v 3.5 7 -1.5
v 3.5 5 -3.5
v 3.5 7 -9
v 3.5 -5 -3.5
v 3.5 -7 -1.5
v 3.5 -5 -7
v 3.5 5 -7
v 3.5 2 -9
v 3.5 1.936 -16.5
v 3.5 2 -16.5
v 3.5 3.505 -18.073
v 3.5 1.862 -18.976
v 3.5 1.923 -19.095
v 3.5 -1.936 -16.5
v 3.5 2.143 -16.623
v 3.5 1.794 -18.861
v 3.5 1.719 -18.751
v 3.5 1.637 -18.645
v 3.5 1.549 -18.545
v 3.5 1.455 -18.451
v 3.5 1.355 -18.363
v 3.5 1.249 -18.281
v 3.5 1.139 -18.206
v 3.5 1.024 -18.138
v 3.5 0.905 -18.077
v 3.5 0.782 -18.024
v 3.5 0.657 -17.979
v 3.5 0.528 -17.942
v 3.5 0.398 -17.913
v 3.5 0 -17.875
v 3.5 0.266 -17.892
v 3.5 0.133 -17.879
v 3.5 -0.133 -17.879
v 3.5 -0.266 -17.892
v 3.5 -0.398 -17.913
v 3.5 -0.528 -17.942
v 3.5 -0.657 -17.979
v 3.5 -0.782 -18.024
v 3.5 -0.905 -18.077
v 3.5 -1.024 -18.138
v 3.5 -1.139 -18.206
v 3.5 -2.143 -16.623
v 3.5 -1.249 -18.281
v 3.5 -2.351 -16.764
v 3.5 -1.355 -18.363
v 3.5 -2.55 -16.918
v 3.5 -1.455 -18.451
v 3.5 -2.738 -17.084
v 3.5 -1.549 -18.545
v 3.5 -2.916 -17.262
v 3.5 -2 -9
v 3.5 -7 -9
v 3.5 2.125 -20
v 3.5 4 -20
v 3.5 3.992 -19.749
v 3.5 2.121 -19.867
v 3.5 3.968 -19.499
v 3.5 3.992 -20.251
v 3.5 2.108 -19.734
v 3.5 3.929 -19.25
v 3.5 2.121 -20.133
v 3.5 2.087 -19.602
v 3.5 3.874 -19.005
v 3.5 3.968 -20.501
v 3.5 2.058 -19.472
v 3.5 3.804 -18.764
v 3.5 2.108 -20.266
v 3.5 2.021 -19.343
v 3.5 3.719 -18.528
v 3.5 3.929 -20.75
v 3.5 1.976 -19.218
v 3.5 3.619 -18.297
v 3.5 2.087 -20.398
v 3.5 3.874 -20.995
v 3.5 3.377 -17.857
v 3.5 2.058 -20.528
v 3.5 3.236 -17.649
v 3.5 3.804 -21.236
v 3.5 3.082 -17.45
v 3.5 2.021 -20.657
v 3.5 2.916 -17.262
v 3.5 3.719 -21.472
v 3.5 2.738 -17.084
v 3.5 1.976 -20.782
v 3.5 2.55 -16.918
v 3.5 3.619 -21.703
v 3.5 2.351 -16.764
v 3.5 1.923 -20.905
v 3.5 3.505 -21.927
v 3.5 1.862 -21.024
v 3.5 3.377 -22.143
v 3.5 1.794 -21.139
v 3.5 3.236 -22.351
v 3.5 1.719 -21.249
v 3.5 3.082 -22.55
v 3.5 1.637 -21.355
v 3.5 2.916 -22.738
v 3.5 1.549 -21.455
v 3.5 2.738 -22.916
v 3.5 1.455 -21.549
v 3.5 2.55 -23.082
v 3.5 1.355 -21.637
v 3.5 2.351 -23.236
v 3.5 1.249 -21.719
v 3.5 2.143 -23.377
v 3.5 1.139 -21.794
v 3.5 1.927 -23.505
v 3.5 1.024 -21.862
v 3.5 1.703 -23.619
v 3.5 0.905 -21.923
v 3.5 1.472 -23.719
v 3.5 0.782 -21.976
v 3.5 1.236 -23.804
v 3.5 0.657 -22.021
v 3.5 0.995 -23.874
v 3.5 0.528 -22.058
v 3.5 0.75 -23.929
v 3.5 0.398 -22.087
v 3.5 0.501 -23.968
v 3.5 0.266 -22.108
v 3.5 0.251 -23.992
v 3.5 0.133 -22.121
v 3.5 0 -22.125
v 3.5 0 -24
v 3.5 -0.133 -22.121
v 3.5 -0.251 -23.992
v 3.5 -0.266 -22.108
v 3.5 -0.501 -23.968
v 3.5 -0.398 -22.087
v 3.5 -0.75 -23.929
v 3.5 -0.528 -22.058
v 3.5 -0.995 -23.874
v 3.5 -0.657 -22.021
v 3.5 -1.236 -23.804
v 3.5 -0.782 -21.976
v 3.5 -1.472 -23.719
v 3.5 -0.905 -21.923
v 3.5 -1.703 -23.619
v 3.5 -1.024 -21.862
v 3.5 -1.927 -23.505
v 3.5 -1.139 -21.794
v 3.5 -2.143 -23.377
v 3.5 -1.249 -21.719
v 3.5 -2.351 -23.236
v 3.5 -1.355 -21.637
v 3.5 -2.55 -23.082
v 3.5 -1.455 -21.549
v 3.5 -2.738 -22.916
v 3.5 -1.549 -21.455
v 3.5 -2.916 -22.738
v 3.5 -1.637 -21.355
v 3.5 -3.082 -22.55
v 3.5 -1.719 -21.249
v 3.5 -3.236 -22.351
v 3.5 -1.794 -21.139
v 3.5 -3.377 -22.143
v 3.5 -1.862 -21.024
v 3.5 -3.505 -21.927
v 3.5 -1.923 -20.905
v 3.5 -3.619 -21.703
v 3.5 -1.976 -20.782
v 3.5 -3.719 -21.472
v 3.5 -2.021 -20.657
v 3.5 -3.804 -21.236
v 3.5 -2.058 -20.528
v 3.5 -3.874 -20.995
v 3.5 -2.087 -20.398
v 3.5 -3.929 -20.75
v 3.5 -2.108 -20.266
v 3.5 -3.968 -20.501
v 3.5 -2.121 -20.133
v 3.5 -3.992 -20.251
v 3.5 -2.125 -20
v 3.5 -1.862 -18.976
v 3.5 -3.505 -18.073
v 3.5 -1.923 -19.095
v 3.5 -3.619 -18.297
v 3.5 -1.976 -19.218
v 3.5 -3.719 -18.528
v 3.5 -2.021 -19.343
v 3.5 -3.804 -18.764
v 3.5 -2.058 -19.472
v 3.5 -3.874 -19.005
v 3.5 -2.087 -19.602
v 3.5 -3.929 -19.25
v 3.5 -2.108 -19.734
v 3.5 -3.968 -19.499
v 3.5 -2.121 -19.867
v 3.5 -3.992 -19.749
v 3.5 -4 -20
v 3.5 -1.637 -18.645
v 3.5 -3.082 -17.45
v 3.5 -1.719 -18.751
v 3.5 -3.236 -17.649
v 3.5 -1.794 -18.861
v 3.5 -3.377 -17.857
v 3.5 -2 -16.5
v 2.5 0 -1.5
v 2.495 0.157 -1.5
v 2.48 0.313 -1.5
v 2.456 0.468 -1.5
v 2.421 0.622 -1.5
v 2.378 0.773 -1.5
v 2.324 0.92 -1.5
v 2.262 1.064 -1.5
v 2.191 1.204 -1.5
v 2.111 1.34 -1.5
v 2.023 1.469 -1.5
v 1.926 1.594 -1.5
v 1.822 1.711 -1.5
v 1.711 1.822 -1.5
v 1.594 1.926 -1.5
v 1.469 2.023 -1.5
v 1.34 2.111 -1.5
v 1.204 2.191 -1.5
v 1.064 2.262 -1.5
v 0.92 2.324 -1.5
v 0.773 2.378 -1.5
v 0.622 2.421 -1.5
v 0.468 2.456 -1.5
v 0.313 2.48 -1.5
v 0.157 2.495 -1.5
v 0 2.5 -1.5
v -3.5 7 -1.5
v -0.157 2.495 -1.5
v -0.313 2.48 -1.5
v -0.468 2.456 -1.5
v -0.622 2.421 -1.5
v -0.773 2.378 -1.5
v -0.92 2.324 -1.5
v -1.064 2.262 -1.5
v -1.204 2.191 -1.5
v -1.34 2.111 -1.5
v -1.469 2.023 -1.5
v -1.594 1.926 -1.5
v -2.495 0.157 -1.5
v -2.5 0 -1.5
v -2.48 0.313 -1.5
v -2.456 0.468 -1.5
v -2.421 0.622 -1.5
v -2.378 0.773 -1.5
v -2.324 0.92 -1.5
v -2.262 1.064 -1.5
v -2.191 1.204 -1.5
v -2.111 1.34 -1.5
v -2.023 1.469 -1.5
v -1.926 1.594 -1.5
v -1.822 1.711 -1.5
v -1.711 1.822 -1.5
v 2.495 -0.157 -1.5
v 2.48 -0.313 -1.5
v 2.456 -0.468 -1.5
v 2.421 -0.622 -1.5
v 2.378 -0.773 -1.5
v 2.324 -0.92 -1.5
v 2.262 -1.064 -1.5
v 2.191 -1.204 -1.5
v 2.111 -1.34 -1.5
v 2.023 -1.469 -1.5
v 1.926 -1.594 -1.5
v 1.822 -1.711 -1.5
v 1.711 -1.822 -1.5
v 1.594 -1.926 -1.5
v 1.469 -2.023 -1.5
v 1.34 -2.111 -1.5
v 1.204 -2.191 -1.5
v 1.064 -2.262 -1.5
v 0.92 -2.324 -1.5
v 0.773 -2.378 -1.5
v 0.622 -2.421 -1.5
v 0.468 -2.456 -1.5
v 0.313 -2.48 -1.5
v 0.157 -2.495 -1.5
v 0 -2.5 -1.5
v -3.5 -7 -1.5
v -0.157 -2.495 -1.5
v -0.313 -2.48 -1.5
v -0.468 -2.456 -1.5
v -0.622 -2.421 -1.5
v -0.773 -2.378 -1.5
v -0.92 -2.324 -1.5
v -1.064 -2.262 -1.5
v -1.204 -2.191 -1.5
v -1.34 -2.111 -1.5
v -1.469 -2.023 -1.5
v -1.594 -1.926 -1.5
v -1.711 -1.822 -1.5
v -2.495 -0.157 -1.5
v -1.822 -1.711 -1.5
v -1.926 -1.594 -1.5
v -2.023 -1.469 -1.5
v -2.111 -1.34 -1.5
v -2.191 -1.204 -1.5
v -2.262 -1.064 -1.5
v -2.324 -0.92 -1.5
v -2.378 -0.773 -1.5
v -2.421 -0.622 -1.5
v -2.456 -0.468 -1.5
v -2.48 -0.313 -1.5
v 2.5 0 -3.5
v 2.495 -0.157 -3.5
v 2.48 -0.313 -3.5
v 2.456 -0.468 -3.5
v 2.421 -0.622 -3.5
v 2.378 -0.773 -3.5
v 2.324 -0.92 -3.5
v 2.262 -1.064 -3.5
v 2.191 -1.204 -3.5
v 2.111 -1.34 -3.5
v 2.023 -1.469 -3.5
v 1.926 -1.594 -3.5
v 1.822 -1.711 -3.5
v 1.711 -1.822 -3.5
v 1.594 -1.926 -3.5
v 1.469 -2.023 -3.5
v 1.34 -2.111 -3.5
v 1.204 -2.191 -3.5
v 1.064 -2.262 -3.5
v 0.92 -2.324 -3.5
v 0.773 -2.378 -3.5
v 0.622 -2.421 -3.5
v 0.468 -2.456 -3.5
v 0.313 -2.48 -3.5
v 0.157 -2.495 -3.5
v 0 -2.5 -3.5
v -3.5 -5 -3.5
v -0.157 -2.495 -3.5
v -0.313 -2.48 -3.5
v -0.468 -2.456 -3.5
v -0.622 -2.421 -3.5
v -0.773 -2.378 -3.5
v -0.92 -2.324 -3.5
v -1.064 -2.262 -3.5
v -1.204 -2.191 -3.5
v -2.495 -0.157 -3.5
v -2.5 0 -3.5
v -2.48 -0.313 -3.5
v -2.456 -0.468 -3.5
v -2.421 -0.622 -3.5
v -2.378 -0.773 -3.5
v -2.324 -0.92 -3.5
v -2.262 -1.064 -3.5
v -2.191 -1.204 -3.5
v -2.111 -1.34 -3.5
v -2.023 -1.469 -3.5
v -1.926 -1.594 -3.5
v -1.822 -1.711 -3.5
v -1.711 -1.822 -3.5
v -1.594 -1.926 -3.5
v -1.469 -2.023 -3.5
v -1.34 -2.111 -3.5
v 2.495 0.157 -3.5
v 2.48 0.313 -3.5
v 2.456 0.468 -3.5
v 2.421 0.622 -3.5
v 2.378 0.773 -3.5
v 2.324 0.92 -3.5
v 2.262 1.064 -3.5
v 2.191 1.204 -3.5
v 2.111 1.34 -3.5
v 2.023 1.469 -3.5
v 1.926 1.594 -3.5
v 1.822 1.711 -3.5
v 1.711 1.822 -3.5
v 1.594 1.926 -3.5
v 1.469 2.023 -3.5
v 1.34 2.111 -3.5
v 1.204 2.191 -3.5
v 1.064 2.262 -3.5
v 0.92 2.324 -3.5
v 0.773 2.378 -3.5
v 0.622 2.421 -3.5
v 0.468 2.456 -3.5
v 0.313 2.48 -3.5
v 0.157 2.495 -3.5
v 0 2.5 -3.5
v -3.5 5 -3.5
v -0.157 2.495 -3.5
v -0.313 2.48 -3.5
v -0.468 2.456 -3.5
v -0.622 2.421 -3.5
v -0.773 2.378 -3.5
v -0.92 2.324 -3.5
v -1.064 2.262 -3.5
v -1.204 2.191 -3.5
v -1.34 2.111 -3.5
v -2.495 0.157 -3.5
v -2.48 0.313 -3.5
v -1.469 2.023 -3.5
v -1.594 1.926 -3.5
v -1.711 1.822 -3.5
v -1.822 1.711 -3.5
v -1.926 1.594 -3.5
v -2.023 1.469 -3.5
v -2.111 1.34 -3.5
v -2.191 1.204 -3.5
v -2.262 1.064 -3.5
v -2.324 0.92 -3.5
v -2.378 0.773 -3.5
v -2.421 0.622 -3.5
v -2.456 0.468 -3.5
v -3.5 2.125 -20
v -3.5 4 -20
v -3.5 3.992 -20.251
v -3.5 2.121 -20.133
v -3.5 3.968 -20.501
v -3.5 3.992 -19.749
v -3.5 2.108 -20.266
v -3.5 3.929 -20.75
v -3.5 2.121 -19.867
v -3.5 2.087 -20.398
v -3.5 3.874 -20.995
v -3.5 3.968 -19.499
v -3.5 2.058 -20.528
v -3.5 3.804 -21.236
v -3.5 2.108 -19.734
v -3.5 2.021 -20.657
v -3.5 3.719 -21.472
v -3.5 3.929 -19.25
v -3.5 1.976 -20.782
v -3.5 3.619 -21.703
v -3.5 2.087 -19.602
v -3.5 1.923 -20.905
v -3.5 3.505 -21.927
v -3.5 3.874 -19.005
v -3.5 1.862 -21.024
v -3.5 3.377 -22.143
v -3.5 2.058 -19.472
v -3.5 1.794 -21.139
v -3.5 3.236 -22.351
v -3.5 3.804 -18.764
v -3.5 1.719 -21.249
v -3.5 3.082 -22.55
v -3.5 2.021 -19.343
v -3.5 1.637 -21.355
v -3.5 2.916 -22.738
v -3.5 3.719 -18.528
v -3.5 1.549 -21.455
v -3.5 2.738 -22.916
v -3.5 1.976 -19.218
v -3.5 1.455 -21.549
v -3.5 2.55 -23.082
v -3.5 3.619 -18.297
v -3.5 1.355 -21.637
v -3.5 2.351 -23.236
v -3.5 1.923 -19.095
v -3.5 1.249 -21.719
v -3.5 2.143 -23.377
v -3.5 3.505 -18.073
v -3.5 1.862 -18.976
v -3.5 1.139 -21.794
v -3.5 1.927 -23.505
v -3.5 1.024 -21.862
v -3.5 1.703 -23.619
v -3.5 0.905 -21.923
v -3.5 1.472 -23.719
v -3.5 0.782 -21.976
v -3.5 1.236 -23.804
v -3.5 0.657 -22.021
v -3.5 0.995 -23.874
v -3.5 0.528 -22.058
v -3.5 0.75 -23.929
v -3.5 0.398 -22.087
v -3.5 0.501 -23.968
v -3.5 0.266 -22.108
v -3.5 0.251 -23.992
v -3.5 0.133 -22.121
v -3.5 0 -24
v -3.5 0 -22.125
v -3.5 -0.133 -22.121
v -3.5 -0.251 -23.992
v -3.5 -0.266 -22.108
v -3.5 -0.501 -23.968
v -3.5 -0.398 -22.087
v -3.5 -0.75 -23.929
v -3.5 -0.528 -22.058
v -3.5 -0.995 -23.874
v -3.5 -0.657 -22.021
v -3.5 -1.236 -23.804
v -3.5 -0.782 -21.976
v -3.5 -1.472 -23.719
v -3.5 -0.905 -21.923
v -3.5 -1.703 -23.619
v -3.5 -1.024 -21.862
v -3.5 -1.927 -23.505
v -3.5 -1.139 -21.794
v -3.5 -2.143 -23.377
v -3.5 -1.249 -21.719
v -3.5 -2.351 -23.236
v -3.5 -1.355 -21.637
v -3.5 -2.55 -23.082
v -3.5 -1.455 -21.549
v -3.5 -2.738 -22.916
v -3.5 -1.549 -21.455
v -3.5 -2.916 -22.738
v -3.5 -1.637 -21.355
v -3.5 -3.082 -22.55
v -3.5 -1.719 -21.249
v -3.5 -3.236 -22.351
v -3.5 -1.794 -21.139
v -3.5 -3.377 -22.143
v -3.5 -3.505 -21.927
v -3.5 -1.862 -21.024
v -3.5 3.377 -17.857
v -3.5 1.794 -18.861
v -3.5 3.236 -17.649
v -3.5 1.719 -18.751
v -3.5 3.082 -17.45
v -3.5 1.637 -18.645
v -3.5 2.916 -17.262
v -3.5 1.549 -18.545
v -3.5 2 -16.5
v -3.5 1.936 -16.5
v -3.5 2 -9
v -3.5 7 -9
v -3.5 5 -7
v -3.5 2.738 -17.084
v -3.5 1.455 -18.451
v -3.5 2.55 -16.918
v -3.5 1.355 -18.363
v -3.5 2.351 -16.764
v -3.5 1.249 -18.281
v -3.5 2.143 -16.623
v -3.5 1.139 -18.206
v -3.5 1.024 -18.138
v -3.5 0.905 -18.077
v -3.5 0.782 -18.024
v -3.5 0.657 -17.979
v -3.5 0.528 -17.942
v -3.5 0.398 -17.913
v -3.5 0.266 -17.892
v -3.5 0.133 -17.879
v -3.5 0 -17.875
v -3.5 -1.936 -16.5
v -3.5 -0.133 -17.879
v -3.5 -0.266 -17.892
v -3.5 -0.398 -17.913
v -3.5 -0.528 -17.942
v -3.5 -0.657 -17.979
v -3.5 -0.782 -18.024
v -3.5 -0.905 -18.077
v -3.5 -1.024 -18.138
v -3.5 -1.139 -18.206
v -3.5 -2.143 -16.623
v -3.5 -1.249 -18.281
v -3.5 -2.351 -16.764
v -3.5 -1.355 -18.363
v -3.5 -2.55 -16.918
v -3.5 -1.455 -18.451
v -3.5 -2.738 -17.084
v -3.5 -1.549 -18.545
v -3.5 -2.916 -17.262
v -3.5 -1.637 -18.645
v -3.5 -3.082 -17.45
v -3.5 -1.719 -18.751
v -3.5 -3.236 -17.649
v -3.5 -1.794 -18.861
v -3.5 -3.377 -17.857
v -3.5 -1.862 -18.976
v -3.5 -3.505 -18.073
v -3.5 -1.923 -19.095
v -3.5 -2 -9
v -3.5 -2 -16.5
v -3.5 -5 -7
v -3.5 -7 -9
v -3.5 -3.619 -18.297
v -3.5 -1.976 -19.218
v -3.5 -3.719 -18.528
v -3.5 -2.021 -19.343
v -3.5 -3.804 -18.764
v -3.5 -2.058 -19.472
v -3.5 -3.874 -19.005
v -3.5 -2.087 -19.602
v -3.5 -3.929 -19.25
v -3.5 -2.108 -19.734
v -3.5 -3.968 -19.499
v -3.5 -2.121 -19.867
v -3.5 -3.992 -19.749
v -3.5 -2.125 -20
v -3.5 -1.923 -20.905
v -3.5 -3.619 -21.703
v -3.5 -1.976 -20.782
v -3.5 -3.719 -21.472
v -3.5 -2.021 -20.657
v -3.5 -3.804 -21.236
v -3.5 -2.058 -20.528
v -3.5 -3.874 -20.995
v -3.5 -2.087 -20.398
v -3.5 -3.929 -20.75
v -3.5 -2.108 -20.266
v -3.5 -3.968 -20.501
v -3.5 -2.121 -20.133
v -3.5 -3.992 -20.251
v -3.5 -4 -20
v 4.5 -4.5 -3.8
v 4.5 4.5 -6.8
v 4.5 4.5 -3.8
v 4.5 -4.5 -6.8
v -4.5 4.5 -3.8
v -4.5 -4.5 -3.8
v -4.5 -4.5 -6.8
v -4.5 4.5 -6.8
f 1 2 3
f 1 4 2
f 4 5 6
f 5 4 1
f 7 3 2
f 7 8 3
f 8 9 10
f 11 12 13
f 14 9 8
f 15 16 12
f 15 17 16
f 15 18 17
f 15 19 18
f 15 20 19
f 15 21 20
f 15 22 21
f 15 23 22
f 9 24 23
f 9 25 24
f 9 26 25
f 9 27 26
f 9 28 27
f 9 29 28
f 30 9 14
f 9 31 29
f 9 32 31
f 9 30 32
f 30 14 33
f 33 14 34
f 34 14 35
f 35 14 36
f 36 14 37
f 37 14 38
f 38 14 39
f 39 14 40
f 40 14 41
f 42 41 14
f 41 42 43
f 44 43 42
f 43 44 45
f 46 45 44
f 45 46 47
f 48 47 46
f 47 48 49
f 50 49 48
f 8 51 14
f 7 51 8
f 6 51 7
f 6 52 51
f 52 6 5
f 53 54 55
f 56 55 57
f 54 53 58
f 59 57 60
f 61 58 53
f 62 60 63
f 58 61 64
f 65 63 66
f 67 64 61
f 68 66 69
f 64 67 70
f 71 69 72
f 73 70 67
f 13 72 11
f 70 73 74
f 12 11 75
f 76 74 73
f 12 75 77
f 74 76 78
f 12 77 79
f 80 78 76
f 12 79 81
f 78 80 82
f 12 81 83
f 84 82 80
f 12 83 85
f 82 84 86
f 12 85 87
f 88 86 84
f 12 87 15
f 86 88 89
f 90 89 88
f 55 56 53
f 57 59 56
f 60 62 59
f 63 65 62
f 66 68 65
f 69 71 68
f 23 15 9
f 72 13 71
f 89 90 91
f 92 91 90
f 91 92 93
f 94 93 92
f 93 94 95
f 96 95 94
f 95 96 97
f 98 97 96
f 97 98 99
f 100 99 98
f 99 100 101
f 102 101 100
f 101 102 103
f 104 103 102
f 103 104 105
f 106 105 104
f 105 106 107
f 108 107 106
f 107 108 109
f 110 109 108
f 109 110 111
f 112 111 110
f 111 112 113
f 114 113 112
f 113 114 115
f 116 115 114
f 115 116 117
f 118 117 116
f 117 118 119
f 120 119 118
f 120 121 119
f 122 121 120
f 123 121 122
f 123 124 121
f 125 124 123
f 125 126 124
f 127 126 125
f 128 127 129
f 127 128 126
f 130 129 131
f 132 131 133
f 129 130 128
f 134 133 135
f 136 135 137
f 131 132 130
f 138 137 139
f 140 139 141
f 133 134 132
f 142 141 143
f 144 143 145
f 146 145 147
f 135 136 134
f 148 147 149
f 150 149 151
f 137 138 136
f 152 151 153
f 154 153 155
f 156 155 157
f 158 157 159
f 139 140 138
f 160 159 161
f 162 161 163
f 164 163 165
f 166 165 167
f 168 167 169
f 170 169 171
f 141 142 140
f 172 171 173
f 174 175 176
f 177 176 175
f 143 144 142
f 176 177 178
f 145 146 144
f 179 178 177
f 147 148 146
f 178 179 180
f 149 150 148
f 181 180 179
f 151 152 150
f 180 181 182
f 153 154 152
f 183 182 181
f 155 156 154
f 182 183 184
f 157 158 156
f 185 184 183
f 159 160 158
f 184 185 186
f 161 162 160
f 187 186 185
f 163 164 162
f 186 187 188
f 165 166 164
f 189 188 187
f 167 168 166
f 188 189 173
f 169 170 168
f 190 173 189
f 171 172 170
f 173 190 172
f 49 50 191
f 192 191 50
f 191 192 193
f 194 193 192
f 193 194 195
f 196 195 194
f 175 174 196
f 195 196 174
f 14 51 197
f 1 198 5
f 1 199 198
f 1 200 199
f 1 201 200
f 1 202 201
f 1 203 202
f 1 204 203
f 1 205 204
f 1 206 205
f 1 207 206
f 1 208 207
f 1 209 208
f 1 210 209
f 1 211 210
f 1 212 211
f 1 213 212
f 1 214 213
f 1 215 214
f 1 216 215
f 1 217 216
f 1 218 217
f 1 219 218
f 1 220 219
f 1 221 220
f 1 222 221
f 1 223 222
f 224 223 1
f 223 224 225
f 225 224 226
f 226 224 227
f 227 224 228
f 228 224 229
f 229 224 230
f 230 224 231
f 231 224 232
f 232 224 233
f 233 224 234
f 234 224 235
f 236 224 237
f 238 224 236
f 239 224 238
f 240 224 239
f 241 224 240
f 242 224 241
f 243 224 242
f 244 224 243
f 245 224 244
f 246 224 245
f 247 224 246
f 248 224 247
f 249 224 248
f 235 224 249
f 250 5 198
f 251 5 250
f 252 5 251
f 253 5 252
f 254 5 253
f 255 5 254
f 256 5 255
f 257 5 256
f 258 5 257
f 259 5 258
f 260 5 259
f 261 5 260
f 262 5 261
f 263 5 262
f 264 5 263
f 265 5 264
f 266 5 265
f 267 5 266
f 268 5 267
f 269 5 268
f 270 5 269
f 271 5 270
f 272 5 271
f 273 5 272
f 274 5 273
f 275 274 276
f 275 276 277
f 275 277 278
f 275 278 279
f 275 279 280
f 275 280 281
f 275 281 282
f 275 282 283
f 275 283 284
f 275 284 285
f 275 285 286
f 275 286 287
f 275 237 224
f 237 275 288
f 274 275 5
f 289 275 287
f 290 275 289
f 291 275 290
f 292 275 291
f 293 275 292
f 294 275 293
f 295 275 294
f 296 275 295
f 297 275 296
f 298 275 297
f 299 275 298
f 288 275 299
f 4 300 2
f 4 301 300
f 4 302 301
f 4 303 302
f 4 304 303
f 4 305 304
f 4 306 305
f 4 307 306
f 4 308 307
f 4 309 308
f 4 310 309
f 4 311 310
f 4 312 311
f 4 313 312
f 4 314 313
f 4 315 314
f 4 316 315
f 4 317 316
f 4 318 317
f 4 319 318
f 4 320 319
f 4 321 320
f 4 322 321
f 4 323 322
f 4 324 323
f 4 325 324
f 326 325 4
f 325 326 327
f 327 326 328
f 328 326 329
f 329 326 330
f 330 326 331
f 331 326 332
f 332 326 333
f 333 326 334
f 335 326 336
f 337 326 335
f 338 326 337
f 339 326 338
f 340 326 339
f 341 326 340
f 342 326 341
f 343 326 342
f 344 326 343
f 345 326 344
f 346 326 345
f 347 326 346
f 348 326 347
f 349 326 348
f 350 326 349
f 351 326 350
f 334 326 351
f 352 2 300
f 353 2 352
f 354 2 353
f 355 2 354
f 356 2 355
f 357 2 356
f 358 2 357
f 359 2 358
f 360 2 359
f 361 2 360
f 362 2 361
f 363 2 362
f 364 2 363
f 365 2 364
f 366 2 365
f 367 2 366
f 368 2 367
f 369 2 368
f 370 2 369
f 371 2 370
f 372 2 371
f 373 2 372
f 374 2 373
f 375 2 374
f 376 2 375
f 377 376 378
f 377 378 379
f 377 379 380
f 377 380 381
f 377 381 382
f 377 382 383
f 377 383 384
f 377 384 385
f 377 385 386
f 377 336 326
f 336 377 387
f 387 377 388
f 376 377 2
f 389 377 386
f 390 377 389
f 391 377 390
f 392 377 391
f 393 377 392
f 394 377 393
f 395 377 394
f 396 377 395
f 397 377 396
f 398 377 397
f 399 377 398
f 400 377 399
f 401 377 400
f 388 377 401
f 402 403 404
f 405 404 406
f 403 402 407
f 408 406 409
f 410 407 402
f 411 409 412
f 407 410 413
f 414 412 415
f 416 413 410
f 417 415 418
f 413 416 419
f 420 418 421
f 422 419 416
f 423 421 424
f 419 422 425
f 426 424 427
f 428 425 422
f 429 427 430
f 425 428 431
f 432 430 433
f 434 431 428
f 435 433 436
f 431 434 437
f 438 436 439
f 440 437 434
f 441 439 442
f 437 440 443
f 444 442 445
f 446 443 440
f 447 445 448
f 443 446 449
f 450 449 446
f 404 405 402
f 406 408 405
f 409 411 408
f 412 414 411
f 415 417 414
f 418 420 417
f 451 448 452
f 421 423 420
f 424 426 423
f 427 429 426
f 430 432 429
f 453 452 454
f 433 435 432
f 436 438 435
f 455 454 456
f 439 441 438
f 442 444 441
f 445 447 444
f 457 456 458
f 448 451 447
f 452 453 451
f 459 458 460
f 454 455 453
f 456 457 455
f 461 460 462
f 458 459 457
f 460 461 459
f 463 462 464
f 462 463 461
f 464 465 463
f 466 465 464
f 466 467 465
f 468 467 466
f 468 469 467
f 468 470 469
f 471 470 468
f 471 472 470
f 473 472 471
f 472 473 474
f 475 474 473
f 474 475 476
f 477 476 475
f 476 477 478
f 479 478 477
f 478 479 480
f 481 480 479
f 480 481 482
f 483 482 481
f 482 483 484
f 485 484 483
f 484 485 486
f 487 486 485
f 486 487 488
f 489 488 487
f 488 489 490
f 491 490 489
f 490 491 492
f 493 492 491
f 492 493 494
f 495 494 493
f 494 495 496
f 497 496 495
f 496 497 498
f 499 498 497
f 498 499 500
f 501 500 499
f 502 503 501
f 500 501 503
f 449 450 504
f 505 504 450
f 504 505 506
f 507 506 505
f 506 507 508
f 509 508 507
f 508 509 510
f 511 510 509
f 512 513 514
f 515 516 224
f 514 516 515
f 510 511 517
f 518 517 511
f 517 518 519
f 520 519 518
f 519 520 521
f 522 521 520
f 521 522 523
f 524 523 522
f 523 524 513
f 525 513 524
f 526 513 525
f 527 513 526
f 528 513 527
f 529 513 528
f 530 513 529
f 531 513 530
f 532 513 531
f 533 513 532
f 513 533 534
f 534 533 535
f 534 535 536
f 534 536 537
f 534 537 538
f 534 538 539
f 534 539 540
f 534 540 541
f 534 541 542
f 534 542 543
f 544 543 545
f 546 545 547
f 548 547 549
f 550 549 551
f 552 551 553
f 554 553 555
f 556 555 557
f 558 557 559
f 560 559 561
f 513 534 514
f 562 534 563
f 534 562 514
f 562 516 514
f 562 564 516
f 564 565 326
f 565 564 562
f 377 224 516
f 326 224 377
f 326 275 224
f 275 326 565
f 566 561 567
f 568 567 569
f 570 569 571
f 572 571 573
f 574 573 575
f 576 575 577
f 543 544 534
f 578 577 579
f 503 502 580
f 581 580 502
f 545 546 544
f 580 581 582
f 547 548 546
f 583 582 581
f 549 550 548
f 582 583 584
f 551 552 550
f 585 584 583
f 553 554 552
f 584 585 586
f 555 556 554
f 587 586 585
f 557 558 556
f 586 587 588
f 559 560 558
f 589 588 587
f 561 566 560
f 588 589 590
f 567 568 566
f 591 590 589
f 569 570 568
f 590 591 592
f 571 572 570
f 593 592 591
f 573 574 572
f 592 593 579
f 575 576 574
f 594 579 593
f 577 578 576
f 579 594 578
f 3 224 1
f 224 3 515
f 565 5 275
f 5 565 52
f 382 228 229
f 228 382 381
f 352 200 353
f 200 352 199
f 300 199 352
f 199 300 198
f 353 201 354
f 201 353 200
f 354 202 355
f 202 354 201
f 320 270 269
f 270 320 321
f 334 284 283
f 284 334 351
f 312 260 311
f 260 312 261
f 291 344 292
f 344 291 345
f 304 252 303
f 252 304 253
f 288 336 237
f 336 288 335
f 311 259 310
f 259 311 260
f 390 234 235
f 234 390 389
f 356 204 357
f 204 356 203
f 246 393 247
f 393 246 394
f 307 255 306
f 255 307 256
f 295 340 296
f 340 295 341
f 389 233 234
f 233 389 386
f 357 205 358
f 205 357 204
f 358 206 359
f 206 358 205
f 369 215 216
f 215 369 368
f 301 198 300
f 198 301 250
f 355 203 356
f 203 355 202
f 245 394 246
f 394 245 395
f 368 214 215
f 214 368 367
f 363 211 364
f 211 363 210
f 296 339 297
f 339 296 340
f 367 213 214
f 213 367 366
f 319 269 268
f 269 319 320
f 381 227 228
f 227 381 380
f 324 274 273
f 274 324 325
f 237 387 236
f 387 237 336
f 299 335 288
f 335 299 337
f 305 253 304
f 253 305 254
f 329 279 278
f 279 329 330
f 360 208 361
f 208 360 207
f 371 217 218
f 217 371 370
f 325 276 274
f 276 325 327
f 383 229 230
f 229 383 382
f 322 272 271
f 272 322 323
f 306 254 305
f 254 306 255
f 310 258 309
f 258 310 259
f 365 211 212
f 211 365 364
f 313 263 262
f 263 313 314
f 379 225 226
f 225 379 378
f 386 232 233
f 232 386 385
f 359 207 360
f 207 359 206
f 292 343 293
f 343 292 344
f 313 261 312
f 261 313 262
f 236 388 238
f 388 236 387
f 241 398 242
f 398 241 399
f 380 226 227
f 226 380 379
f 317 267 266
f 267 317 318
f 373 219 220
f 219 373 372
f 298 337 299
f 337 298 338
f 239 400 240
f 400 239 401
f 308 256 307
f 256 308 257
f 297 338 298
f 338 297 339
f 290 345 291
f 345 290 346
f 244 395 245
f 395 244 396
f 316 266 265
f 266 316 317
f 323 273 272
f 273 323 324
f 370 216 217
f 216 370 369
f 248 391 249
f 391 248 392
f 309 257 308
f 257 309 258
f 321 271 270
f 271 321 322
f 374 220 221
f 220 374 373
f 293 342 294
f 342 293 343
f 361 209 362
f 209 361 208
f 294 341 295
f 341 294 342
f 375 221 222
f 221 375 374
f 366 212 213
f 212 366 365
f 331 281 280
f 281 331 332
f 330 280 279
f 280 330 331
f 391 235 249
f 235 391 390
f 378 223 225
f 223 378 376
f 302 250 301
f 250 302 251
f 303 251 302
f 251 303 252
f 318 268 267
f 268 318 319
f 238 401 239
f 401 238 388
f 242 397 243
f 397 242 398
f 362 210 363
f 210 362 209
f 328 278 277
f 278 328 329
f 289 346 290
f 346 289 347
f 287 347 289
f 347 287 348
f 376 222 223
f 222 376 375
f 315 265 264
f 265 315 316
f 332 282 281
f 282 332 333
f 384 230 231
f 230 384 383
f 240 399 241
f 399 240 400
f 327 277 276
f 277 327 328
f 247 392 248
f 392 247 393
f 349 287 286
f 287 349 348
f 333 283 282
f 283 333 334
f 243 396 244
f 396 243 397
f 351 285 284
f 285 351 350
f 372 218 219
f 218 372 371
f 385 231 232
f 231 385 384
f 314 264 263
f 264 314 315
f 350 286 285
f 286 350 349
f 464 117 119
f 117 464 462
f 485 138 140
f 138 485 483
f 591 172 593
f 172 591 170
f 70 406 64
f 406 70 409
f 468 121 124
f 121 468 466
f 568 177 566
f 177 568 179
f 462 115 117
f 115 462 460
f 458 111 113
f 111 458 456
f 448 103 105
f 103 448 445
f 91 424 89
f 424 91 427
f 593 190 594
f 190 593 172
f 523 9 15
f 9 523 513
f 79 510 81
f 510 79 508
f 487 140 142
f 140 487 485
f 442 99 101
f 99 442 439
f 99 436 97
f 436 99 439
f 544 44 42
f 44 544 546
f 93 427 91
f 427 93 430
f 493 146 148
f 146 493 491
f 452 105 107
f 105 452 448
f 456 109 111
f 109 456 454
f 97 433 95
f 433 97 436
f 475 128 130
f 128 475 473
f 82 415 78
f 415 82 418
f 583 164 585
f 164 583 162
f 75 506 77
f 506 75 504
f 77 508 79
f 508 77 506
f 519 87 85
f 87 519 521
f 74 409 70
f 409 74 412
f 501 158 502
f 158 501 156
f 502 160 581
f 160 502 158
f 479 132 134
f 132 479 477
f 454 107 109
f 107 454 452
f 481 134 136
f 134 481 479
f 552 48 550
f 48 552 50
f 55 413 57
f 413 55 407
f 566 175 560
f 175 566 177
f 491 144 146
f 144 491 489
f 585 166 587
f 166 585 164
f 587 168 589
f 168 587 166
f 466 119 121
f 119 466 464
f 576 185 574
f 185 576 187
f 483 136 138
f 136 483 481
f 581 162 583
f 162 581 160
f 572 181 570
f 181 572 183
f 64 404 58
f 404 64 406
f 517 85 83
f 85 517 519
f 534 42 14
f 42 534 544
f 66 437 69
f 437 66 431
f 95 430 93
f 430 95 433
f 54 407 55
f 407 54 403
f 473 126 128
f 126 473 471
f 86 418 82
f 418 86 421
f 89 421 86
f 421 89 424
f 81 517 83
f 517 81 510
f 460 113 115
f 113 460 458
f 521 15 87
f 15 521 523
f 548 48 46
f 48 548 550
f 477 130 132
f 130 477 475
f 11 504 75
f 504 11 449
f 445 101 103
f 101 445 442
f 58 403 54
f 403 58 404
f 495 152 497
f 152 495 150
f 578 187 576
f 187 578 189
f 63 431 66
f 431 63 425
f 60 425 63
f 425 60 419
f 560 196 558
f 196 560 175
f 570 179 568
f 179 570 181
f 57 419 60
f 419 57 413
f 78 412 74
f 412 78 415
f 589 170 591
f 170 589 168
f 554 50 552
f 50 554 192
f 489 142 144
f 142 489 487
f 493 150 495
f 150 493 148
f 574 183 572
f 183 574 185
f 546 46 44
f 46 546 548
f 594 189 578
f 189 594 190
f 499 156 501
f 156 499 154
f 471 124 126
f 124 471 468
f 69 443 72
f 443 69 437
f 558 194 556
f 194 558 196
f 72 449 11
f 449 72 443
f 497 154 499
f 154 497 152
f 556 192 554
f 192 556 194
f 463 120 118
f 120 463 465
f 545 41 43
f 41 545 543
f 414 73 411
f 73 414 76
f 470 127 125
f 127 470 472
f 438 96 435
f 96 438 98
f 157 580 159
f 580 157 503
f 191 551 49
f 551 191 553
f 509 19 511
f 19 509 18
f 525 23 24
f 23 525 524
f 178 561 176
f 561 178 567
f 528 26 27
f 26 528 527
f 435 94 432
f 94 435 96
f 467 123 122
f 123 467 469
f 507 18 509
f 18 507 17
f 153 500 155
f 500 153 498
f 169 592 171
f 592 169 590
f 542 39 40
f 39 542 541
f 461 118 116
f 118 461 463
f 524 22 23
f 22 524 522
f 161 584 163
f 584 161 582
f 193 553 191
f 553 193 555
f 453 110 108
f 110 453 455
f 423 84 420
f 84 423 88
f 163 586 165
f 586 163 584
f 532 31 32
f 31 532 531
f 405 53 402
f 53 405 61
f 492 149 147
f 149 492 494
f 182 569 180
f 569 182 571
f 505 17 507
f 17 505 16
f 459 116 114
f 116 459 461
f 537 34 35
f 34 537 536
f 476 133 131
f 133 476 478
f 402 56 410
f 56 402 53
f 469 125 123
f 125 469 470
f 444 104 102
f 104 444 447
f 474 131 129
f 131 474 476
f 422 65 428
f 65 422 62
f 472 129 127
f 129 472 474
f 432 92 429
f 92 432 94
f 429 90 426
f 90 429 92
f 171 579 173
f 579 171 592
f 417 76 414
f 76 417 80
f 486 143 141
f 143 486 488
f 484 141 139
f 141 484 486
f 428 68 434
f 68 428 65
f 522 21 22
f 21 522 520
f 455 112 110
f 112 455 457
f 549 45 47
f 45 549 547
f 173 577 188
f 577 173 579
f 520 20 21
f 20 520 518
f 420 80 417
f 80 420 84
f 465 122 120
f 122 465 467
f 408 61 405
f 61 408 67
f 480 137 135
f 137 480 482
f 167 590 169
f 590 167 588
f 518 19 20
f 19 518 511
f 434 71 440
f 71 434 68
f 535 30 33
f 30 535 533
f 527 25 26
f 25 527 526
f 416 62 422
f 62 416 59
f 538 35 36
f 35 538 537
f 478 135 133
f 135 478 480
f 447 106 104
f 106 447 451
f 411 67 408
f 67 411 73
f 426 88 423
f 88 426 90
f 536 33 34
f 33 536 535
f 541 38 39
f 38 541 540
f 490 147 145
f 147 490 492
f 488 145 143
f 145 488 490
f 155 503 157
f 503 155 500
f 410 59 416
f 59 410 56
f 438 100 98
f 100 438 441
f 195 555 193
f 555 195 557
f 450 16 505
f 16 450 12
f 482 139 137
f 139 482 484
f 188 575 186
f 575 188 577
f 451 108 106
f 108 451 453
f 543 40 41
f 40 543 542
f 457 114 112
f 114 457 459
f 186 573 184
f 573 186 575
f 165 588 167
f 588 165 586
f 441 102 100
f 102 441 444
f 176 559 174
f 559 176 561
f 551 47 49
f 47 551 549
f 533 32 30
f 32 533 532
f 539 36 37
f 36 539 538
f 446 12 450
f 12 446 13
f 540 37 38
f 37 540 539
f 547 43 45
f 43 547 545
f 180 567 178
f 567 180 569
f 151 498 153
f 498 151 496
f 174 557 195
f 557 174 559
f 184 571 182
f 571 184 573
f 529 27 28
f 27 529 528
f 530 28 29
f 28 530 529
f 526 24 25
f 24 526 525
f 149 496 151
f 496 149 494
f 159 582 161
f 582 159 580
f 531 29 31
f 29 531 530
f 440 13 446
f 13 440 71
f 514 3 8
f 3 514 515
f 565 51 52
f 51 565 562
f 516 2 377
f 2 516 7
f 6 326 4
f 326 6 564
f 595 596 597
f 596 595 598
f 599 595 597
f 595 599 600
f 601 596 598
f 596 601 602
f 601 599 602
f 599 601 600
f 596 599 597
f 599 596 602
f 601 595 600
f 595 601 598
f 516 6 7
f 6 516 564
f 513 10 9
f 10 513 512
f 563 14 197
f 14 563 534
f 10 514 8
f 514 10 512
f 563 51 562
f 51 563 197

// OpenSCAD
$fn=100;
//Bearing();
//Magnet();
translate([0,0,-20]) Mholder();
//Top();
//Base();



module Base(){
    height=30; // change height
    difference(){
        translate([0,0,-height+5]) cylinder(h=height, d=32);
        translate([0,0,-.5]) cylinder(h=6, d=16.5);
        translate([0,0,-height+0]) cylinder(h=height, d=28);
}
    difference(){
        union(){
            translate([0,-13,-height+5]) cylinder(h=height, d=6);
            translate([0,13,-height+5]) cylinder(h=height, d=6);
        }
        translate([0,-13,-height+4]) cylinder(h=height+2, d=2);
        translate([0,13,-height+4]) cylinder(h=height+2, d=2);
    }
}

module Magnet(){
    #translate([0,0,-20]) rotate([0,90,0])cylinder(h=10, d=4, center=true);
}

module Mholder(){
    
    difference(){
        translate([0,0,17.5]) cube ([7,14,2],center=true);//top of nut hole
        translate([0,0,13]) cylinder(h=8, d=5);//centre hole
    }
    translate([-3.5,5,11]) cube ([7,2,7]);//side nut hole
    translate([-3.5,-7,11.0]) cube ([7,2,7]);//- side of nut hole
    translate([0,0,14.7]) cube ([9,9,3],center=true);//fake nut
    
    translate([0,0,12]) cube ([7,14,2.0],center=true);//bottom of nut hole
    translate([0,0,8]) cube ([7,4,9], center=true);//shaft
    difference(){
        rotate([0,90,0]) cylinder(h=7, d=8, center=true);
        translate([0,0,0]) rotate([0,90,0])cylinder(h=10, d=4.25, center=true);
    }
}

module Top(){

    union (){
        translate([0,3,6]) cube ([4,68,4]);//shaft
        translate([+0,70,6.8]) rotate([0,25,0]) cube ([2,15,10]);//grip
    }
    rotate([0,0, 120]) union (){
        translate([0,3,6]) cube ([4,68,4]);//shaft
        translate([+0,70.6,6.8]) rotate([0,25,0]) cube ([2,15,10]);//grip
    }
    rotate([0,0, 240]) union (){
        translate([0,3,6]) cube ([4,68,4]);//shaft
        translate([+0,70.6,6.8]) rotate([0,25,0]) cube ([2,15,10]);//grip
    }
  difference(){
    translate([0,0,6]) cylinder(h=4, r=16);
    translate([0,0,3]) cylinder(h=8, d=5);//centre hole
}  
}


module Bearing(){

    difference(){
        cylinder(h=5, d=16);
        translate ([0,0,-.5]) cylinder(h=6, d=5);
    }
       
}
